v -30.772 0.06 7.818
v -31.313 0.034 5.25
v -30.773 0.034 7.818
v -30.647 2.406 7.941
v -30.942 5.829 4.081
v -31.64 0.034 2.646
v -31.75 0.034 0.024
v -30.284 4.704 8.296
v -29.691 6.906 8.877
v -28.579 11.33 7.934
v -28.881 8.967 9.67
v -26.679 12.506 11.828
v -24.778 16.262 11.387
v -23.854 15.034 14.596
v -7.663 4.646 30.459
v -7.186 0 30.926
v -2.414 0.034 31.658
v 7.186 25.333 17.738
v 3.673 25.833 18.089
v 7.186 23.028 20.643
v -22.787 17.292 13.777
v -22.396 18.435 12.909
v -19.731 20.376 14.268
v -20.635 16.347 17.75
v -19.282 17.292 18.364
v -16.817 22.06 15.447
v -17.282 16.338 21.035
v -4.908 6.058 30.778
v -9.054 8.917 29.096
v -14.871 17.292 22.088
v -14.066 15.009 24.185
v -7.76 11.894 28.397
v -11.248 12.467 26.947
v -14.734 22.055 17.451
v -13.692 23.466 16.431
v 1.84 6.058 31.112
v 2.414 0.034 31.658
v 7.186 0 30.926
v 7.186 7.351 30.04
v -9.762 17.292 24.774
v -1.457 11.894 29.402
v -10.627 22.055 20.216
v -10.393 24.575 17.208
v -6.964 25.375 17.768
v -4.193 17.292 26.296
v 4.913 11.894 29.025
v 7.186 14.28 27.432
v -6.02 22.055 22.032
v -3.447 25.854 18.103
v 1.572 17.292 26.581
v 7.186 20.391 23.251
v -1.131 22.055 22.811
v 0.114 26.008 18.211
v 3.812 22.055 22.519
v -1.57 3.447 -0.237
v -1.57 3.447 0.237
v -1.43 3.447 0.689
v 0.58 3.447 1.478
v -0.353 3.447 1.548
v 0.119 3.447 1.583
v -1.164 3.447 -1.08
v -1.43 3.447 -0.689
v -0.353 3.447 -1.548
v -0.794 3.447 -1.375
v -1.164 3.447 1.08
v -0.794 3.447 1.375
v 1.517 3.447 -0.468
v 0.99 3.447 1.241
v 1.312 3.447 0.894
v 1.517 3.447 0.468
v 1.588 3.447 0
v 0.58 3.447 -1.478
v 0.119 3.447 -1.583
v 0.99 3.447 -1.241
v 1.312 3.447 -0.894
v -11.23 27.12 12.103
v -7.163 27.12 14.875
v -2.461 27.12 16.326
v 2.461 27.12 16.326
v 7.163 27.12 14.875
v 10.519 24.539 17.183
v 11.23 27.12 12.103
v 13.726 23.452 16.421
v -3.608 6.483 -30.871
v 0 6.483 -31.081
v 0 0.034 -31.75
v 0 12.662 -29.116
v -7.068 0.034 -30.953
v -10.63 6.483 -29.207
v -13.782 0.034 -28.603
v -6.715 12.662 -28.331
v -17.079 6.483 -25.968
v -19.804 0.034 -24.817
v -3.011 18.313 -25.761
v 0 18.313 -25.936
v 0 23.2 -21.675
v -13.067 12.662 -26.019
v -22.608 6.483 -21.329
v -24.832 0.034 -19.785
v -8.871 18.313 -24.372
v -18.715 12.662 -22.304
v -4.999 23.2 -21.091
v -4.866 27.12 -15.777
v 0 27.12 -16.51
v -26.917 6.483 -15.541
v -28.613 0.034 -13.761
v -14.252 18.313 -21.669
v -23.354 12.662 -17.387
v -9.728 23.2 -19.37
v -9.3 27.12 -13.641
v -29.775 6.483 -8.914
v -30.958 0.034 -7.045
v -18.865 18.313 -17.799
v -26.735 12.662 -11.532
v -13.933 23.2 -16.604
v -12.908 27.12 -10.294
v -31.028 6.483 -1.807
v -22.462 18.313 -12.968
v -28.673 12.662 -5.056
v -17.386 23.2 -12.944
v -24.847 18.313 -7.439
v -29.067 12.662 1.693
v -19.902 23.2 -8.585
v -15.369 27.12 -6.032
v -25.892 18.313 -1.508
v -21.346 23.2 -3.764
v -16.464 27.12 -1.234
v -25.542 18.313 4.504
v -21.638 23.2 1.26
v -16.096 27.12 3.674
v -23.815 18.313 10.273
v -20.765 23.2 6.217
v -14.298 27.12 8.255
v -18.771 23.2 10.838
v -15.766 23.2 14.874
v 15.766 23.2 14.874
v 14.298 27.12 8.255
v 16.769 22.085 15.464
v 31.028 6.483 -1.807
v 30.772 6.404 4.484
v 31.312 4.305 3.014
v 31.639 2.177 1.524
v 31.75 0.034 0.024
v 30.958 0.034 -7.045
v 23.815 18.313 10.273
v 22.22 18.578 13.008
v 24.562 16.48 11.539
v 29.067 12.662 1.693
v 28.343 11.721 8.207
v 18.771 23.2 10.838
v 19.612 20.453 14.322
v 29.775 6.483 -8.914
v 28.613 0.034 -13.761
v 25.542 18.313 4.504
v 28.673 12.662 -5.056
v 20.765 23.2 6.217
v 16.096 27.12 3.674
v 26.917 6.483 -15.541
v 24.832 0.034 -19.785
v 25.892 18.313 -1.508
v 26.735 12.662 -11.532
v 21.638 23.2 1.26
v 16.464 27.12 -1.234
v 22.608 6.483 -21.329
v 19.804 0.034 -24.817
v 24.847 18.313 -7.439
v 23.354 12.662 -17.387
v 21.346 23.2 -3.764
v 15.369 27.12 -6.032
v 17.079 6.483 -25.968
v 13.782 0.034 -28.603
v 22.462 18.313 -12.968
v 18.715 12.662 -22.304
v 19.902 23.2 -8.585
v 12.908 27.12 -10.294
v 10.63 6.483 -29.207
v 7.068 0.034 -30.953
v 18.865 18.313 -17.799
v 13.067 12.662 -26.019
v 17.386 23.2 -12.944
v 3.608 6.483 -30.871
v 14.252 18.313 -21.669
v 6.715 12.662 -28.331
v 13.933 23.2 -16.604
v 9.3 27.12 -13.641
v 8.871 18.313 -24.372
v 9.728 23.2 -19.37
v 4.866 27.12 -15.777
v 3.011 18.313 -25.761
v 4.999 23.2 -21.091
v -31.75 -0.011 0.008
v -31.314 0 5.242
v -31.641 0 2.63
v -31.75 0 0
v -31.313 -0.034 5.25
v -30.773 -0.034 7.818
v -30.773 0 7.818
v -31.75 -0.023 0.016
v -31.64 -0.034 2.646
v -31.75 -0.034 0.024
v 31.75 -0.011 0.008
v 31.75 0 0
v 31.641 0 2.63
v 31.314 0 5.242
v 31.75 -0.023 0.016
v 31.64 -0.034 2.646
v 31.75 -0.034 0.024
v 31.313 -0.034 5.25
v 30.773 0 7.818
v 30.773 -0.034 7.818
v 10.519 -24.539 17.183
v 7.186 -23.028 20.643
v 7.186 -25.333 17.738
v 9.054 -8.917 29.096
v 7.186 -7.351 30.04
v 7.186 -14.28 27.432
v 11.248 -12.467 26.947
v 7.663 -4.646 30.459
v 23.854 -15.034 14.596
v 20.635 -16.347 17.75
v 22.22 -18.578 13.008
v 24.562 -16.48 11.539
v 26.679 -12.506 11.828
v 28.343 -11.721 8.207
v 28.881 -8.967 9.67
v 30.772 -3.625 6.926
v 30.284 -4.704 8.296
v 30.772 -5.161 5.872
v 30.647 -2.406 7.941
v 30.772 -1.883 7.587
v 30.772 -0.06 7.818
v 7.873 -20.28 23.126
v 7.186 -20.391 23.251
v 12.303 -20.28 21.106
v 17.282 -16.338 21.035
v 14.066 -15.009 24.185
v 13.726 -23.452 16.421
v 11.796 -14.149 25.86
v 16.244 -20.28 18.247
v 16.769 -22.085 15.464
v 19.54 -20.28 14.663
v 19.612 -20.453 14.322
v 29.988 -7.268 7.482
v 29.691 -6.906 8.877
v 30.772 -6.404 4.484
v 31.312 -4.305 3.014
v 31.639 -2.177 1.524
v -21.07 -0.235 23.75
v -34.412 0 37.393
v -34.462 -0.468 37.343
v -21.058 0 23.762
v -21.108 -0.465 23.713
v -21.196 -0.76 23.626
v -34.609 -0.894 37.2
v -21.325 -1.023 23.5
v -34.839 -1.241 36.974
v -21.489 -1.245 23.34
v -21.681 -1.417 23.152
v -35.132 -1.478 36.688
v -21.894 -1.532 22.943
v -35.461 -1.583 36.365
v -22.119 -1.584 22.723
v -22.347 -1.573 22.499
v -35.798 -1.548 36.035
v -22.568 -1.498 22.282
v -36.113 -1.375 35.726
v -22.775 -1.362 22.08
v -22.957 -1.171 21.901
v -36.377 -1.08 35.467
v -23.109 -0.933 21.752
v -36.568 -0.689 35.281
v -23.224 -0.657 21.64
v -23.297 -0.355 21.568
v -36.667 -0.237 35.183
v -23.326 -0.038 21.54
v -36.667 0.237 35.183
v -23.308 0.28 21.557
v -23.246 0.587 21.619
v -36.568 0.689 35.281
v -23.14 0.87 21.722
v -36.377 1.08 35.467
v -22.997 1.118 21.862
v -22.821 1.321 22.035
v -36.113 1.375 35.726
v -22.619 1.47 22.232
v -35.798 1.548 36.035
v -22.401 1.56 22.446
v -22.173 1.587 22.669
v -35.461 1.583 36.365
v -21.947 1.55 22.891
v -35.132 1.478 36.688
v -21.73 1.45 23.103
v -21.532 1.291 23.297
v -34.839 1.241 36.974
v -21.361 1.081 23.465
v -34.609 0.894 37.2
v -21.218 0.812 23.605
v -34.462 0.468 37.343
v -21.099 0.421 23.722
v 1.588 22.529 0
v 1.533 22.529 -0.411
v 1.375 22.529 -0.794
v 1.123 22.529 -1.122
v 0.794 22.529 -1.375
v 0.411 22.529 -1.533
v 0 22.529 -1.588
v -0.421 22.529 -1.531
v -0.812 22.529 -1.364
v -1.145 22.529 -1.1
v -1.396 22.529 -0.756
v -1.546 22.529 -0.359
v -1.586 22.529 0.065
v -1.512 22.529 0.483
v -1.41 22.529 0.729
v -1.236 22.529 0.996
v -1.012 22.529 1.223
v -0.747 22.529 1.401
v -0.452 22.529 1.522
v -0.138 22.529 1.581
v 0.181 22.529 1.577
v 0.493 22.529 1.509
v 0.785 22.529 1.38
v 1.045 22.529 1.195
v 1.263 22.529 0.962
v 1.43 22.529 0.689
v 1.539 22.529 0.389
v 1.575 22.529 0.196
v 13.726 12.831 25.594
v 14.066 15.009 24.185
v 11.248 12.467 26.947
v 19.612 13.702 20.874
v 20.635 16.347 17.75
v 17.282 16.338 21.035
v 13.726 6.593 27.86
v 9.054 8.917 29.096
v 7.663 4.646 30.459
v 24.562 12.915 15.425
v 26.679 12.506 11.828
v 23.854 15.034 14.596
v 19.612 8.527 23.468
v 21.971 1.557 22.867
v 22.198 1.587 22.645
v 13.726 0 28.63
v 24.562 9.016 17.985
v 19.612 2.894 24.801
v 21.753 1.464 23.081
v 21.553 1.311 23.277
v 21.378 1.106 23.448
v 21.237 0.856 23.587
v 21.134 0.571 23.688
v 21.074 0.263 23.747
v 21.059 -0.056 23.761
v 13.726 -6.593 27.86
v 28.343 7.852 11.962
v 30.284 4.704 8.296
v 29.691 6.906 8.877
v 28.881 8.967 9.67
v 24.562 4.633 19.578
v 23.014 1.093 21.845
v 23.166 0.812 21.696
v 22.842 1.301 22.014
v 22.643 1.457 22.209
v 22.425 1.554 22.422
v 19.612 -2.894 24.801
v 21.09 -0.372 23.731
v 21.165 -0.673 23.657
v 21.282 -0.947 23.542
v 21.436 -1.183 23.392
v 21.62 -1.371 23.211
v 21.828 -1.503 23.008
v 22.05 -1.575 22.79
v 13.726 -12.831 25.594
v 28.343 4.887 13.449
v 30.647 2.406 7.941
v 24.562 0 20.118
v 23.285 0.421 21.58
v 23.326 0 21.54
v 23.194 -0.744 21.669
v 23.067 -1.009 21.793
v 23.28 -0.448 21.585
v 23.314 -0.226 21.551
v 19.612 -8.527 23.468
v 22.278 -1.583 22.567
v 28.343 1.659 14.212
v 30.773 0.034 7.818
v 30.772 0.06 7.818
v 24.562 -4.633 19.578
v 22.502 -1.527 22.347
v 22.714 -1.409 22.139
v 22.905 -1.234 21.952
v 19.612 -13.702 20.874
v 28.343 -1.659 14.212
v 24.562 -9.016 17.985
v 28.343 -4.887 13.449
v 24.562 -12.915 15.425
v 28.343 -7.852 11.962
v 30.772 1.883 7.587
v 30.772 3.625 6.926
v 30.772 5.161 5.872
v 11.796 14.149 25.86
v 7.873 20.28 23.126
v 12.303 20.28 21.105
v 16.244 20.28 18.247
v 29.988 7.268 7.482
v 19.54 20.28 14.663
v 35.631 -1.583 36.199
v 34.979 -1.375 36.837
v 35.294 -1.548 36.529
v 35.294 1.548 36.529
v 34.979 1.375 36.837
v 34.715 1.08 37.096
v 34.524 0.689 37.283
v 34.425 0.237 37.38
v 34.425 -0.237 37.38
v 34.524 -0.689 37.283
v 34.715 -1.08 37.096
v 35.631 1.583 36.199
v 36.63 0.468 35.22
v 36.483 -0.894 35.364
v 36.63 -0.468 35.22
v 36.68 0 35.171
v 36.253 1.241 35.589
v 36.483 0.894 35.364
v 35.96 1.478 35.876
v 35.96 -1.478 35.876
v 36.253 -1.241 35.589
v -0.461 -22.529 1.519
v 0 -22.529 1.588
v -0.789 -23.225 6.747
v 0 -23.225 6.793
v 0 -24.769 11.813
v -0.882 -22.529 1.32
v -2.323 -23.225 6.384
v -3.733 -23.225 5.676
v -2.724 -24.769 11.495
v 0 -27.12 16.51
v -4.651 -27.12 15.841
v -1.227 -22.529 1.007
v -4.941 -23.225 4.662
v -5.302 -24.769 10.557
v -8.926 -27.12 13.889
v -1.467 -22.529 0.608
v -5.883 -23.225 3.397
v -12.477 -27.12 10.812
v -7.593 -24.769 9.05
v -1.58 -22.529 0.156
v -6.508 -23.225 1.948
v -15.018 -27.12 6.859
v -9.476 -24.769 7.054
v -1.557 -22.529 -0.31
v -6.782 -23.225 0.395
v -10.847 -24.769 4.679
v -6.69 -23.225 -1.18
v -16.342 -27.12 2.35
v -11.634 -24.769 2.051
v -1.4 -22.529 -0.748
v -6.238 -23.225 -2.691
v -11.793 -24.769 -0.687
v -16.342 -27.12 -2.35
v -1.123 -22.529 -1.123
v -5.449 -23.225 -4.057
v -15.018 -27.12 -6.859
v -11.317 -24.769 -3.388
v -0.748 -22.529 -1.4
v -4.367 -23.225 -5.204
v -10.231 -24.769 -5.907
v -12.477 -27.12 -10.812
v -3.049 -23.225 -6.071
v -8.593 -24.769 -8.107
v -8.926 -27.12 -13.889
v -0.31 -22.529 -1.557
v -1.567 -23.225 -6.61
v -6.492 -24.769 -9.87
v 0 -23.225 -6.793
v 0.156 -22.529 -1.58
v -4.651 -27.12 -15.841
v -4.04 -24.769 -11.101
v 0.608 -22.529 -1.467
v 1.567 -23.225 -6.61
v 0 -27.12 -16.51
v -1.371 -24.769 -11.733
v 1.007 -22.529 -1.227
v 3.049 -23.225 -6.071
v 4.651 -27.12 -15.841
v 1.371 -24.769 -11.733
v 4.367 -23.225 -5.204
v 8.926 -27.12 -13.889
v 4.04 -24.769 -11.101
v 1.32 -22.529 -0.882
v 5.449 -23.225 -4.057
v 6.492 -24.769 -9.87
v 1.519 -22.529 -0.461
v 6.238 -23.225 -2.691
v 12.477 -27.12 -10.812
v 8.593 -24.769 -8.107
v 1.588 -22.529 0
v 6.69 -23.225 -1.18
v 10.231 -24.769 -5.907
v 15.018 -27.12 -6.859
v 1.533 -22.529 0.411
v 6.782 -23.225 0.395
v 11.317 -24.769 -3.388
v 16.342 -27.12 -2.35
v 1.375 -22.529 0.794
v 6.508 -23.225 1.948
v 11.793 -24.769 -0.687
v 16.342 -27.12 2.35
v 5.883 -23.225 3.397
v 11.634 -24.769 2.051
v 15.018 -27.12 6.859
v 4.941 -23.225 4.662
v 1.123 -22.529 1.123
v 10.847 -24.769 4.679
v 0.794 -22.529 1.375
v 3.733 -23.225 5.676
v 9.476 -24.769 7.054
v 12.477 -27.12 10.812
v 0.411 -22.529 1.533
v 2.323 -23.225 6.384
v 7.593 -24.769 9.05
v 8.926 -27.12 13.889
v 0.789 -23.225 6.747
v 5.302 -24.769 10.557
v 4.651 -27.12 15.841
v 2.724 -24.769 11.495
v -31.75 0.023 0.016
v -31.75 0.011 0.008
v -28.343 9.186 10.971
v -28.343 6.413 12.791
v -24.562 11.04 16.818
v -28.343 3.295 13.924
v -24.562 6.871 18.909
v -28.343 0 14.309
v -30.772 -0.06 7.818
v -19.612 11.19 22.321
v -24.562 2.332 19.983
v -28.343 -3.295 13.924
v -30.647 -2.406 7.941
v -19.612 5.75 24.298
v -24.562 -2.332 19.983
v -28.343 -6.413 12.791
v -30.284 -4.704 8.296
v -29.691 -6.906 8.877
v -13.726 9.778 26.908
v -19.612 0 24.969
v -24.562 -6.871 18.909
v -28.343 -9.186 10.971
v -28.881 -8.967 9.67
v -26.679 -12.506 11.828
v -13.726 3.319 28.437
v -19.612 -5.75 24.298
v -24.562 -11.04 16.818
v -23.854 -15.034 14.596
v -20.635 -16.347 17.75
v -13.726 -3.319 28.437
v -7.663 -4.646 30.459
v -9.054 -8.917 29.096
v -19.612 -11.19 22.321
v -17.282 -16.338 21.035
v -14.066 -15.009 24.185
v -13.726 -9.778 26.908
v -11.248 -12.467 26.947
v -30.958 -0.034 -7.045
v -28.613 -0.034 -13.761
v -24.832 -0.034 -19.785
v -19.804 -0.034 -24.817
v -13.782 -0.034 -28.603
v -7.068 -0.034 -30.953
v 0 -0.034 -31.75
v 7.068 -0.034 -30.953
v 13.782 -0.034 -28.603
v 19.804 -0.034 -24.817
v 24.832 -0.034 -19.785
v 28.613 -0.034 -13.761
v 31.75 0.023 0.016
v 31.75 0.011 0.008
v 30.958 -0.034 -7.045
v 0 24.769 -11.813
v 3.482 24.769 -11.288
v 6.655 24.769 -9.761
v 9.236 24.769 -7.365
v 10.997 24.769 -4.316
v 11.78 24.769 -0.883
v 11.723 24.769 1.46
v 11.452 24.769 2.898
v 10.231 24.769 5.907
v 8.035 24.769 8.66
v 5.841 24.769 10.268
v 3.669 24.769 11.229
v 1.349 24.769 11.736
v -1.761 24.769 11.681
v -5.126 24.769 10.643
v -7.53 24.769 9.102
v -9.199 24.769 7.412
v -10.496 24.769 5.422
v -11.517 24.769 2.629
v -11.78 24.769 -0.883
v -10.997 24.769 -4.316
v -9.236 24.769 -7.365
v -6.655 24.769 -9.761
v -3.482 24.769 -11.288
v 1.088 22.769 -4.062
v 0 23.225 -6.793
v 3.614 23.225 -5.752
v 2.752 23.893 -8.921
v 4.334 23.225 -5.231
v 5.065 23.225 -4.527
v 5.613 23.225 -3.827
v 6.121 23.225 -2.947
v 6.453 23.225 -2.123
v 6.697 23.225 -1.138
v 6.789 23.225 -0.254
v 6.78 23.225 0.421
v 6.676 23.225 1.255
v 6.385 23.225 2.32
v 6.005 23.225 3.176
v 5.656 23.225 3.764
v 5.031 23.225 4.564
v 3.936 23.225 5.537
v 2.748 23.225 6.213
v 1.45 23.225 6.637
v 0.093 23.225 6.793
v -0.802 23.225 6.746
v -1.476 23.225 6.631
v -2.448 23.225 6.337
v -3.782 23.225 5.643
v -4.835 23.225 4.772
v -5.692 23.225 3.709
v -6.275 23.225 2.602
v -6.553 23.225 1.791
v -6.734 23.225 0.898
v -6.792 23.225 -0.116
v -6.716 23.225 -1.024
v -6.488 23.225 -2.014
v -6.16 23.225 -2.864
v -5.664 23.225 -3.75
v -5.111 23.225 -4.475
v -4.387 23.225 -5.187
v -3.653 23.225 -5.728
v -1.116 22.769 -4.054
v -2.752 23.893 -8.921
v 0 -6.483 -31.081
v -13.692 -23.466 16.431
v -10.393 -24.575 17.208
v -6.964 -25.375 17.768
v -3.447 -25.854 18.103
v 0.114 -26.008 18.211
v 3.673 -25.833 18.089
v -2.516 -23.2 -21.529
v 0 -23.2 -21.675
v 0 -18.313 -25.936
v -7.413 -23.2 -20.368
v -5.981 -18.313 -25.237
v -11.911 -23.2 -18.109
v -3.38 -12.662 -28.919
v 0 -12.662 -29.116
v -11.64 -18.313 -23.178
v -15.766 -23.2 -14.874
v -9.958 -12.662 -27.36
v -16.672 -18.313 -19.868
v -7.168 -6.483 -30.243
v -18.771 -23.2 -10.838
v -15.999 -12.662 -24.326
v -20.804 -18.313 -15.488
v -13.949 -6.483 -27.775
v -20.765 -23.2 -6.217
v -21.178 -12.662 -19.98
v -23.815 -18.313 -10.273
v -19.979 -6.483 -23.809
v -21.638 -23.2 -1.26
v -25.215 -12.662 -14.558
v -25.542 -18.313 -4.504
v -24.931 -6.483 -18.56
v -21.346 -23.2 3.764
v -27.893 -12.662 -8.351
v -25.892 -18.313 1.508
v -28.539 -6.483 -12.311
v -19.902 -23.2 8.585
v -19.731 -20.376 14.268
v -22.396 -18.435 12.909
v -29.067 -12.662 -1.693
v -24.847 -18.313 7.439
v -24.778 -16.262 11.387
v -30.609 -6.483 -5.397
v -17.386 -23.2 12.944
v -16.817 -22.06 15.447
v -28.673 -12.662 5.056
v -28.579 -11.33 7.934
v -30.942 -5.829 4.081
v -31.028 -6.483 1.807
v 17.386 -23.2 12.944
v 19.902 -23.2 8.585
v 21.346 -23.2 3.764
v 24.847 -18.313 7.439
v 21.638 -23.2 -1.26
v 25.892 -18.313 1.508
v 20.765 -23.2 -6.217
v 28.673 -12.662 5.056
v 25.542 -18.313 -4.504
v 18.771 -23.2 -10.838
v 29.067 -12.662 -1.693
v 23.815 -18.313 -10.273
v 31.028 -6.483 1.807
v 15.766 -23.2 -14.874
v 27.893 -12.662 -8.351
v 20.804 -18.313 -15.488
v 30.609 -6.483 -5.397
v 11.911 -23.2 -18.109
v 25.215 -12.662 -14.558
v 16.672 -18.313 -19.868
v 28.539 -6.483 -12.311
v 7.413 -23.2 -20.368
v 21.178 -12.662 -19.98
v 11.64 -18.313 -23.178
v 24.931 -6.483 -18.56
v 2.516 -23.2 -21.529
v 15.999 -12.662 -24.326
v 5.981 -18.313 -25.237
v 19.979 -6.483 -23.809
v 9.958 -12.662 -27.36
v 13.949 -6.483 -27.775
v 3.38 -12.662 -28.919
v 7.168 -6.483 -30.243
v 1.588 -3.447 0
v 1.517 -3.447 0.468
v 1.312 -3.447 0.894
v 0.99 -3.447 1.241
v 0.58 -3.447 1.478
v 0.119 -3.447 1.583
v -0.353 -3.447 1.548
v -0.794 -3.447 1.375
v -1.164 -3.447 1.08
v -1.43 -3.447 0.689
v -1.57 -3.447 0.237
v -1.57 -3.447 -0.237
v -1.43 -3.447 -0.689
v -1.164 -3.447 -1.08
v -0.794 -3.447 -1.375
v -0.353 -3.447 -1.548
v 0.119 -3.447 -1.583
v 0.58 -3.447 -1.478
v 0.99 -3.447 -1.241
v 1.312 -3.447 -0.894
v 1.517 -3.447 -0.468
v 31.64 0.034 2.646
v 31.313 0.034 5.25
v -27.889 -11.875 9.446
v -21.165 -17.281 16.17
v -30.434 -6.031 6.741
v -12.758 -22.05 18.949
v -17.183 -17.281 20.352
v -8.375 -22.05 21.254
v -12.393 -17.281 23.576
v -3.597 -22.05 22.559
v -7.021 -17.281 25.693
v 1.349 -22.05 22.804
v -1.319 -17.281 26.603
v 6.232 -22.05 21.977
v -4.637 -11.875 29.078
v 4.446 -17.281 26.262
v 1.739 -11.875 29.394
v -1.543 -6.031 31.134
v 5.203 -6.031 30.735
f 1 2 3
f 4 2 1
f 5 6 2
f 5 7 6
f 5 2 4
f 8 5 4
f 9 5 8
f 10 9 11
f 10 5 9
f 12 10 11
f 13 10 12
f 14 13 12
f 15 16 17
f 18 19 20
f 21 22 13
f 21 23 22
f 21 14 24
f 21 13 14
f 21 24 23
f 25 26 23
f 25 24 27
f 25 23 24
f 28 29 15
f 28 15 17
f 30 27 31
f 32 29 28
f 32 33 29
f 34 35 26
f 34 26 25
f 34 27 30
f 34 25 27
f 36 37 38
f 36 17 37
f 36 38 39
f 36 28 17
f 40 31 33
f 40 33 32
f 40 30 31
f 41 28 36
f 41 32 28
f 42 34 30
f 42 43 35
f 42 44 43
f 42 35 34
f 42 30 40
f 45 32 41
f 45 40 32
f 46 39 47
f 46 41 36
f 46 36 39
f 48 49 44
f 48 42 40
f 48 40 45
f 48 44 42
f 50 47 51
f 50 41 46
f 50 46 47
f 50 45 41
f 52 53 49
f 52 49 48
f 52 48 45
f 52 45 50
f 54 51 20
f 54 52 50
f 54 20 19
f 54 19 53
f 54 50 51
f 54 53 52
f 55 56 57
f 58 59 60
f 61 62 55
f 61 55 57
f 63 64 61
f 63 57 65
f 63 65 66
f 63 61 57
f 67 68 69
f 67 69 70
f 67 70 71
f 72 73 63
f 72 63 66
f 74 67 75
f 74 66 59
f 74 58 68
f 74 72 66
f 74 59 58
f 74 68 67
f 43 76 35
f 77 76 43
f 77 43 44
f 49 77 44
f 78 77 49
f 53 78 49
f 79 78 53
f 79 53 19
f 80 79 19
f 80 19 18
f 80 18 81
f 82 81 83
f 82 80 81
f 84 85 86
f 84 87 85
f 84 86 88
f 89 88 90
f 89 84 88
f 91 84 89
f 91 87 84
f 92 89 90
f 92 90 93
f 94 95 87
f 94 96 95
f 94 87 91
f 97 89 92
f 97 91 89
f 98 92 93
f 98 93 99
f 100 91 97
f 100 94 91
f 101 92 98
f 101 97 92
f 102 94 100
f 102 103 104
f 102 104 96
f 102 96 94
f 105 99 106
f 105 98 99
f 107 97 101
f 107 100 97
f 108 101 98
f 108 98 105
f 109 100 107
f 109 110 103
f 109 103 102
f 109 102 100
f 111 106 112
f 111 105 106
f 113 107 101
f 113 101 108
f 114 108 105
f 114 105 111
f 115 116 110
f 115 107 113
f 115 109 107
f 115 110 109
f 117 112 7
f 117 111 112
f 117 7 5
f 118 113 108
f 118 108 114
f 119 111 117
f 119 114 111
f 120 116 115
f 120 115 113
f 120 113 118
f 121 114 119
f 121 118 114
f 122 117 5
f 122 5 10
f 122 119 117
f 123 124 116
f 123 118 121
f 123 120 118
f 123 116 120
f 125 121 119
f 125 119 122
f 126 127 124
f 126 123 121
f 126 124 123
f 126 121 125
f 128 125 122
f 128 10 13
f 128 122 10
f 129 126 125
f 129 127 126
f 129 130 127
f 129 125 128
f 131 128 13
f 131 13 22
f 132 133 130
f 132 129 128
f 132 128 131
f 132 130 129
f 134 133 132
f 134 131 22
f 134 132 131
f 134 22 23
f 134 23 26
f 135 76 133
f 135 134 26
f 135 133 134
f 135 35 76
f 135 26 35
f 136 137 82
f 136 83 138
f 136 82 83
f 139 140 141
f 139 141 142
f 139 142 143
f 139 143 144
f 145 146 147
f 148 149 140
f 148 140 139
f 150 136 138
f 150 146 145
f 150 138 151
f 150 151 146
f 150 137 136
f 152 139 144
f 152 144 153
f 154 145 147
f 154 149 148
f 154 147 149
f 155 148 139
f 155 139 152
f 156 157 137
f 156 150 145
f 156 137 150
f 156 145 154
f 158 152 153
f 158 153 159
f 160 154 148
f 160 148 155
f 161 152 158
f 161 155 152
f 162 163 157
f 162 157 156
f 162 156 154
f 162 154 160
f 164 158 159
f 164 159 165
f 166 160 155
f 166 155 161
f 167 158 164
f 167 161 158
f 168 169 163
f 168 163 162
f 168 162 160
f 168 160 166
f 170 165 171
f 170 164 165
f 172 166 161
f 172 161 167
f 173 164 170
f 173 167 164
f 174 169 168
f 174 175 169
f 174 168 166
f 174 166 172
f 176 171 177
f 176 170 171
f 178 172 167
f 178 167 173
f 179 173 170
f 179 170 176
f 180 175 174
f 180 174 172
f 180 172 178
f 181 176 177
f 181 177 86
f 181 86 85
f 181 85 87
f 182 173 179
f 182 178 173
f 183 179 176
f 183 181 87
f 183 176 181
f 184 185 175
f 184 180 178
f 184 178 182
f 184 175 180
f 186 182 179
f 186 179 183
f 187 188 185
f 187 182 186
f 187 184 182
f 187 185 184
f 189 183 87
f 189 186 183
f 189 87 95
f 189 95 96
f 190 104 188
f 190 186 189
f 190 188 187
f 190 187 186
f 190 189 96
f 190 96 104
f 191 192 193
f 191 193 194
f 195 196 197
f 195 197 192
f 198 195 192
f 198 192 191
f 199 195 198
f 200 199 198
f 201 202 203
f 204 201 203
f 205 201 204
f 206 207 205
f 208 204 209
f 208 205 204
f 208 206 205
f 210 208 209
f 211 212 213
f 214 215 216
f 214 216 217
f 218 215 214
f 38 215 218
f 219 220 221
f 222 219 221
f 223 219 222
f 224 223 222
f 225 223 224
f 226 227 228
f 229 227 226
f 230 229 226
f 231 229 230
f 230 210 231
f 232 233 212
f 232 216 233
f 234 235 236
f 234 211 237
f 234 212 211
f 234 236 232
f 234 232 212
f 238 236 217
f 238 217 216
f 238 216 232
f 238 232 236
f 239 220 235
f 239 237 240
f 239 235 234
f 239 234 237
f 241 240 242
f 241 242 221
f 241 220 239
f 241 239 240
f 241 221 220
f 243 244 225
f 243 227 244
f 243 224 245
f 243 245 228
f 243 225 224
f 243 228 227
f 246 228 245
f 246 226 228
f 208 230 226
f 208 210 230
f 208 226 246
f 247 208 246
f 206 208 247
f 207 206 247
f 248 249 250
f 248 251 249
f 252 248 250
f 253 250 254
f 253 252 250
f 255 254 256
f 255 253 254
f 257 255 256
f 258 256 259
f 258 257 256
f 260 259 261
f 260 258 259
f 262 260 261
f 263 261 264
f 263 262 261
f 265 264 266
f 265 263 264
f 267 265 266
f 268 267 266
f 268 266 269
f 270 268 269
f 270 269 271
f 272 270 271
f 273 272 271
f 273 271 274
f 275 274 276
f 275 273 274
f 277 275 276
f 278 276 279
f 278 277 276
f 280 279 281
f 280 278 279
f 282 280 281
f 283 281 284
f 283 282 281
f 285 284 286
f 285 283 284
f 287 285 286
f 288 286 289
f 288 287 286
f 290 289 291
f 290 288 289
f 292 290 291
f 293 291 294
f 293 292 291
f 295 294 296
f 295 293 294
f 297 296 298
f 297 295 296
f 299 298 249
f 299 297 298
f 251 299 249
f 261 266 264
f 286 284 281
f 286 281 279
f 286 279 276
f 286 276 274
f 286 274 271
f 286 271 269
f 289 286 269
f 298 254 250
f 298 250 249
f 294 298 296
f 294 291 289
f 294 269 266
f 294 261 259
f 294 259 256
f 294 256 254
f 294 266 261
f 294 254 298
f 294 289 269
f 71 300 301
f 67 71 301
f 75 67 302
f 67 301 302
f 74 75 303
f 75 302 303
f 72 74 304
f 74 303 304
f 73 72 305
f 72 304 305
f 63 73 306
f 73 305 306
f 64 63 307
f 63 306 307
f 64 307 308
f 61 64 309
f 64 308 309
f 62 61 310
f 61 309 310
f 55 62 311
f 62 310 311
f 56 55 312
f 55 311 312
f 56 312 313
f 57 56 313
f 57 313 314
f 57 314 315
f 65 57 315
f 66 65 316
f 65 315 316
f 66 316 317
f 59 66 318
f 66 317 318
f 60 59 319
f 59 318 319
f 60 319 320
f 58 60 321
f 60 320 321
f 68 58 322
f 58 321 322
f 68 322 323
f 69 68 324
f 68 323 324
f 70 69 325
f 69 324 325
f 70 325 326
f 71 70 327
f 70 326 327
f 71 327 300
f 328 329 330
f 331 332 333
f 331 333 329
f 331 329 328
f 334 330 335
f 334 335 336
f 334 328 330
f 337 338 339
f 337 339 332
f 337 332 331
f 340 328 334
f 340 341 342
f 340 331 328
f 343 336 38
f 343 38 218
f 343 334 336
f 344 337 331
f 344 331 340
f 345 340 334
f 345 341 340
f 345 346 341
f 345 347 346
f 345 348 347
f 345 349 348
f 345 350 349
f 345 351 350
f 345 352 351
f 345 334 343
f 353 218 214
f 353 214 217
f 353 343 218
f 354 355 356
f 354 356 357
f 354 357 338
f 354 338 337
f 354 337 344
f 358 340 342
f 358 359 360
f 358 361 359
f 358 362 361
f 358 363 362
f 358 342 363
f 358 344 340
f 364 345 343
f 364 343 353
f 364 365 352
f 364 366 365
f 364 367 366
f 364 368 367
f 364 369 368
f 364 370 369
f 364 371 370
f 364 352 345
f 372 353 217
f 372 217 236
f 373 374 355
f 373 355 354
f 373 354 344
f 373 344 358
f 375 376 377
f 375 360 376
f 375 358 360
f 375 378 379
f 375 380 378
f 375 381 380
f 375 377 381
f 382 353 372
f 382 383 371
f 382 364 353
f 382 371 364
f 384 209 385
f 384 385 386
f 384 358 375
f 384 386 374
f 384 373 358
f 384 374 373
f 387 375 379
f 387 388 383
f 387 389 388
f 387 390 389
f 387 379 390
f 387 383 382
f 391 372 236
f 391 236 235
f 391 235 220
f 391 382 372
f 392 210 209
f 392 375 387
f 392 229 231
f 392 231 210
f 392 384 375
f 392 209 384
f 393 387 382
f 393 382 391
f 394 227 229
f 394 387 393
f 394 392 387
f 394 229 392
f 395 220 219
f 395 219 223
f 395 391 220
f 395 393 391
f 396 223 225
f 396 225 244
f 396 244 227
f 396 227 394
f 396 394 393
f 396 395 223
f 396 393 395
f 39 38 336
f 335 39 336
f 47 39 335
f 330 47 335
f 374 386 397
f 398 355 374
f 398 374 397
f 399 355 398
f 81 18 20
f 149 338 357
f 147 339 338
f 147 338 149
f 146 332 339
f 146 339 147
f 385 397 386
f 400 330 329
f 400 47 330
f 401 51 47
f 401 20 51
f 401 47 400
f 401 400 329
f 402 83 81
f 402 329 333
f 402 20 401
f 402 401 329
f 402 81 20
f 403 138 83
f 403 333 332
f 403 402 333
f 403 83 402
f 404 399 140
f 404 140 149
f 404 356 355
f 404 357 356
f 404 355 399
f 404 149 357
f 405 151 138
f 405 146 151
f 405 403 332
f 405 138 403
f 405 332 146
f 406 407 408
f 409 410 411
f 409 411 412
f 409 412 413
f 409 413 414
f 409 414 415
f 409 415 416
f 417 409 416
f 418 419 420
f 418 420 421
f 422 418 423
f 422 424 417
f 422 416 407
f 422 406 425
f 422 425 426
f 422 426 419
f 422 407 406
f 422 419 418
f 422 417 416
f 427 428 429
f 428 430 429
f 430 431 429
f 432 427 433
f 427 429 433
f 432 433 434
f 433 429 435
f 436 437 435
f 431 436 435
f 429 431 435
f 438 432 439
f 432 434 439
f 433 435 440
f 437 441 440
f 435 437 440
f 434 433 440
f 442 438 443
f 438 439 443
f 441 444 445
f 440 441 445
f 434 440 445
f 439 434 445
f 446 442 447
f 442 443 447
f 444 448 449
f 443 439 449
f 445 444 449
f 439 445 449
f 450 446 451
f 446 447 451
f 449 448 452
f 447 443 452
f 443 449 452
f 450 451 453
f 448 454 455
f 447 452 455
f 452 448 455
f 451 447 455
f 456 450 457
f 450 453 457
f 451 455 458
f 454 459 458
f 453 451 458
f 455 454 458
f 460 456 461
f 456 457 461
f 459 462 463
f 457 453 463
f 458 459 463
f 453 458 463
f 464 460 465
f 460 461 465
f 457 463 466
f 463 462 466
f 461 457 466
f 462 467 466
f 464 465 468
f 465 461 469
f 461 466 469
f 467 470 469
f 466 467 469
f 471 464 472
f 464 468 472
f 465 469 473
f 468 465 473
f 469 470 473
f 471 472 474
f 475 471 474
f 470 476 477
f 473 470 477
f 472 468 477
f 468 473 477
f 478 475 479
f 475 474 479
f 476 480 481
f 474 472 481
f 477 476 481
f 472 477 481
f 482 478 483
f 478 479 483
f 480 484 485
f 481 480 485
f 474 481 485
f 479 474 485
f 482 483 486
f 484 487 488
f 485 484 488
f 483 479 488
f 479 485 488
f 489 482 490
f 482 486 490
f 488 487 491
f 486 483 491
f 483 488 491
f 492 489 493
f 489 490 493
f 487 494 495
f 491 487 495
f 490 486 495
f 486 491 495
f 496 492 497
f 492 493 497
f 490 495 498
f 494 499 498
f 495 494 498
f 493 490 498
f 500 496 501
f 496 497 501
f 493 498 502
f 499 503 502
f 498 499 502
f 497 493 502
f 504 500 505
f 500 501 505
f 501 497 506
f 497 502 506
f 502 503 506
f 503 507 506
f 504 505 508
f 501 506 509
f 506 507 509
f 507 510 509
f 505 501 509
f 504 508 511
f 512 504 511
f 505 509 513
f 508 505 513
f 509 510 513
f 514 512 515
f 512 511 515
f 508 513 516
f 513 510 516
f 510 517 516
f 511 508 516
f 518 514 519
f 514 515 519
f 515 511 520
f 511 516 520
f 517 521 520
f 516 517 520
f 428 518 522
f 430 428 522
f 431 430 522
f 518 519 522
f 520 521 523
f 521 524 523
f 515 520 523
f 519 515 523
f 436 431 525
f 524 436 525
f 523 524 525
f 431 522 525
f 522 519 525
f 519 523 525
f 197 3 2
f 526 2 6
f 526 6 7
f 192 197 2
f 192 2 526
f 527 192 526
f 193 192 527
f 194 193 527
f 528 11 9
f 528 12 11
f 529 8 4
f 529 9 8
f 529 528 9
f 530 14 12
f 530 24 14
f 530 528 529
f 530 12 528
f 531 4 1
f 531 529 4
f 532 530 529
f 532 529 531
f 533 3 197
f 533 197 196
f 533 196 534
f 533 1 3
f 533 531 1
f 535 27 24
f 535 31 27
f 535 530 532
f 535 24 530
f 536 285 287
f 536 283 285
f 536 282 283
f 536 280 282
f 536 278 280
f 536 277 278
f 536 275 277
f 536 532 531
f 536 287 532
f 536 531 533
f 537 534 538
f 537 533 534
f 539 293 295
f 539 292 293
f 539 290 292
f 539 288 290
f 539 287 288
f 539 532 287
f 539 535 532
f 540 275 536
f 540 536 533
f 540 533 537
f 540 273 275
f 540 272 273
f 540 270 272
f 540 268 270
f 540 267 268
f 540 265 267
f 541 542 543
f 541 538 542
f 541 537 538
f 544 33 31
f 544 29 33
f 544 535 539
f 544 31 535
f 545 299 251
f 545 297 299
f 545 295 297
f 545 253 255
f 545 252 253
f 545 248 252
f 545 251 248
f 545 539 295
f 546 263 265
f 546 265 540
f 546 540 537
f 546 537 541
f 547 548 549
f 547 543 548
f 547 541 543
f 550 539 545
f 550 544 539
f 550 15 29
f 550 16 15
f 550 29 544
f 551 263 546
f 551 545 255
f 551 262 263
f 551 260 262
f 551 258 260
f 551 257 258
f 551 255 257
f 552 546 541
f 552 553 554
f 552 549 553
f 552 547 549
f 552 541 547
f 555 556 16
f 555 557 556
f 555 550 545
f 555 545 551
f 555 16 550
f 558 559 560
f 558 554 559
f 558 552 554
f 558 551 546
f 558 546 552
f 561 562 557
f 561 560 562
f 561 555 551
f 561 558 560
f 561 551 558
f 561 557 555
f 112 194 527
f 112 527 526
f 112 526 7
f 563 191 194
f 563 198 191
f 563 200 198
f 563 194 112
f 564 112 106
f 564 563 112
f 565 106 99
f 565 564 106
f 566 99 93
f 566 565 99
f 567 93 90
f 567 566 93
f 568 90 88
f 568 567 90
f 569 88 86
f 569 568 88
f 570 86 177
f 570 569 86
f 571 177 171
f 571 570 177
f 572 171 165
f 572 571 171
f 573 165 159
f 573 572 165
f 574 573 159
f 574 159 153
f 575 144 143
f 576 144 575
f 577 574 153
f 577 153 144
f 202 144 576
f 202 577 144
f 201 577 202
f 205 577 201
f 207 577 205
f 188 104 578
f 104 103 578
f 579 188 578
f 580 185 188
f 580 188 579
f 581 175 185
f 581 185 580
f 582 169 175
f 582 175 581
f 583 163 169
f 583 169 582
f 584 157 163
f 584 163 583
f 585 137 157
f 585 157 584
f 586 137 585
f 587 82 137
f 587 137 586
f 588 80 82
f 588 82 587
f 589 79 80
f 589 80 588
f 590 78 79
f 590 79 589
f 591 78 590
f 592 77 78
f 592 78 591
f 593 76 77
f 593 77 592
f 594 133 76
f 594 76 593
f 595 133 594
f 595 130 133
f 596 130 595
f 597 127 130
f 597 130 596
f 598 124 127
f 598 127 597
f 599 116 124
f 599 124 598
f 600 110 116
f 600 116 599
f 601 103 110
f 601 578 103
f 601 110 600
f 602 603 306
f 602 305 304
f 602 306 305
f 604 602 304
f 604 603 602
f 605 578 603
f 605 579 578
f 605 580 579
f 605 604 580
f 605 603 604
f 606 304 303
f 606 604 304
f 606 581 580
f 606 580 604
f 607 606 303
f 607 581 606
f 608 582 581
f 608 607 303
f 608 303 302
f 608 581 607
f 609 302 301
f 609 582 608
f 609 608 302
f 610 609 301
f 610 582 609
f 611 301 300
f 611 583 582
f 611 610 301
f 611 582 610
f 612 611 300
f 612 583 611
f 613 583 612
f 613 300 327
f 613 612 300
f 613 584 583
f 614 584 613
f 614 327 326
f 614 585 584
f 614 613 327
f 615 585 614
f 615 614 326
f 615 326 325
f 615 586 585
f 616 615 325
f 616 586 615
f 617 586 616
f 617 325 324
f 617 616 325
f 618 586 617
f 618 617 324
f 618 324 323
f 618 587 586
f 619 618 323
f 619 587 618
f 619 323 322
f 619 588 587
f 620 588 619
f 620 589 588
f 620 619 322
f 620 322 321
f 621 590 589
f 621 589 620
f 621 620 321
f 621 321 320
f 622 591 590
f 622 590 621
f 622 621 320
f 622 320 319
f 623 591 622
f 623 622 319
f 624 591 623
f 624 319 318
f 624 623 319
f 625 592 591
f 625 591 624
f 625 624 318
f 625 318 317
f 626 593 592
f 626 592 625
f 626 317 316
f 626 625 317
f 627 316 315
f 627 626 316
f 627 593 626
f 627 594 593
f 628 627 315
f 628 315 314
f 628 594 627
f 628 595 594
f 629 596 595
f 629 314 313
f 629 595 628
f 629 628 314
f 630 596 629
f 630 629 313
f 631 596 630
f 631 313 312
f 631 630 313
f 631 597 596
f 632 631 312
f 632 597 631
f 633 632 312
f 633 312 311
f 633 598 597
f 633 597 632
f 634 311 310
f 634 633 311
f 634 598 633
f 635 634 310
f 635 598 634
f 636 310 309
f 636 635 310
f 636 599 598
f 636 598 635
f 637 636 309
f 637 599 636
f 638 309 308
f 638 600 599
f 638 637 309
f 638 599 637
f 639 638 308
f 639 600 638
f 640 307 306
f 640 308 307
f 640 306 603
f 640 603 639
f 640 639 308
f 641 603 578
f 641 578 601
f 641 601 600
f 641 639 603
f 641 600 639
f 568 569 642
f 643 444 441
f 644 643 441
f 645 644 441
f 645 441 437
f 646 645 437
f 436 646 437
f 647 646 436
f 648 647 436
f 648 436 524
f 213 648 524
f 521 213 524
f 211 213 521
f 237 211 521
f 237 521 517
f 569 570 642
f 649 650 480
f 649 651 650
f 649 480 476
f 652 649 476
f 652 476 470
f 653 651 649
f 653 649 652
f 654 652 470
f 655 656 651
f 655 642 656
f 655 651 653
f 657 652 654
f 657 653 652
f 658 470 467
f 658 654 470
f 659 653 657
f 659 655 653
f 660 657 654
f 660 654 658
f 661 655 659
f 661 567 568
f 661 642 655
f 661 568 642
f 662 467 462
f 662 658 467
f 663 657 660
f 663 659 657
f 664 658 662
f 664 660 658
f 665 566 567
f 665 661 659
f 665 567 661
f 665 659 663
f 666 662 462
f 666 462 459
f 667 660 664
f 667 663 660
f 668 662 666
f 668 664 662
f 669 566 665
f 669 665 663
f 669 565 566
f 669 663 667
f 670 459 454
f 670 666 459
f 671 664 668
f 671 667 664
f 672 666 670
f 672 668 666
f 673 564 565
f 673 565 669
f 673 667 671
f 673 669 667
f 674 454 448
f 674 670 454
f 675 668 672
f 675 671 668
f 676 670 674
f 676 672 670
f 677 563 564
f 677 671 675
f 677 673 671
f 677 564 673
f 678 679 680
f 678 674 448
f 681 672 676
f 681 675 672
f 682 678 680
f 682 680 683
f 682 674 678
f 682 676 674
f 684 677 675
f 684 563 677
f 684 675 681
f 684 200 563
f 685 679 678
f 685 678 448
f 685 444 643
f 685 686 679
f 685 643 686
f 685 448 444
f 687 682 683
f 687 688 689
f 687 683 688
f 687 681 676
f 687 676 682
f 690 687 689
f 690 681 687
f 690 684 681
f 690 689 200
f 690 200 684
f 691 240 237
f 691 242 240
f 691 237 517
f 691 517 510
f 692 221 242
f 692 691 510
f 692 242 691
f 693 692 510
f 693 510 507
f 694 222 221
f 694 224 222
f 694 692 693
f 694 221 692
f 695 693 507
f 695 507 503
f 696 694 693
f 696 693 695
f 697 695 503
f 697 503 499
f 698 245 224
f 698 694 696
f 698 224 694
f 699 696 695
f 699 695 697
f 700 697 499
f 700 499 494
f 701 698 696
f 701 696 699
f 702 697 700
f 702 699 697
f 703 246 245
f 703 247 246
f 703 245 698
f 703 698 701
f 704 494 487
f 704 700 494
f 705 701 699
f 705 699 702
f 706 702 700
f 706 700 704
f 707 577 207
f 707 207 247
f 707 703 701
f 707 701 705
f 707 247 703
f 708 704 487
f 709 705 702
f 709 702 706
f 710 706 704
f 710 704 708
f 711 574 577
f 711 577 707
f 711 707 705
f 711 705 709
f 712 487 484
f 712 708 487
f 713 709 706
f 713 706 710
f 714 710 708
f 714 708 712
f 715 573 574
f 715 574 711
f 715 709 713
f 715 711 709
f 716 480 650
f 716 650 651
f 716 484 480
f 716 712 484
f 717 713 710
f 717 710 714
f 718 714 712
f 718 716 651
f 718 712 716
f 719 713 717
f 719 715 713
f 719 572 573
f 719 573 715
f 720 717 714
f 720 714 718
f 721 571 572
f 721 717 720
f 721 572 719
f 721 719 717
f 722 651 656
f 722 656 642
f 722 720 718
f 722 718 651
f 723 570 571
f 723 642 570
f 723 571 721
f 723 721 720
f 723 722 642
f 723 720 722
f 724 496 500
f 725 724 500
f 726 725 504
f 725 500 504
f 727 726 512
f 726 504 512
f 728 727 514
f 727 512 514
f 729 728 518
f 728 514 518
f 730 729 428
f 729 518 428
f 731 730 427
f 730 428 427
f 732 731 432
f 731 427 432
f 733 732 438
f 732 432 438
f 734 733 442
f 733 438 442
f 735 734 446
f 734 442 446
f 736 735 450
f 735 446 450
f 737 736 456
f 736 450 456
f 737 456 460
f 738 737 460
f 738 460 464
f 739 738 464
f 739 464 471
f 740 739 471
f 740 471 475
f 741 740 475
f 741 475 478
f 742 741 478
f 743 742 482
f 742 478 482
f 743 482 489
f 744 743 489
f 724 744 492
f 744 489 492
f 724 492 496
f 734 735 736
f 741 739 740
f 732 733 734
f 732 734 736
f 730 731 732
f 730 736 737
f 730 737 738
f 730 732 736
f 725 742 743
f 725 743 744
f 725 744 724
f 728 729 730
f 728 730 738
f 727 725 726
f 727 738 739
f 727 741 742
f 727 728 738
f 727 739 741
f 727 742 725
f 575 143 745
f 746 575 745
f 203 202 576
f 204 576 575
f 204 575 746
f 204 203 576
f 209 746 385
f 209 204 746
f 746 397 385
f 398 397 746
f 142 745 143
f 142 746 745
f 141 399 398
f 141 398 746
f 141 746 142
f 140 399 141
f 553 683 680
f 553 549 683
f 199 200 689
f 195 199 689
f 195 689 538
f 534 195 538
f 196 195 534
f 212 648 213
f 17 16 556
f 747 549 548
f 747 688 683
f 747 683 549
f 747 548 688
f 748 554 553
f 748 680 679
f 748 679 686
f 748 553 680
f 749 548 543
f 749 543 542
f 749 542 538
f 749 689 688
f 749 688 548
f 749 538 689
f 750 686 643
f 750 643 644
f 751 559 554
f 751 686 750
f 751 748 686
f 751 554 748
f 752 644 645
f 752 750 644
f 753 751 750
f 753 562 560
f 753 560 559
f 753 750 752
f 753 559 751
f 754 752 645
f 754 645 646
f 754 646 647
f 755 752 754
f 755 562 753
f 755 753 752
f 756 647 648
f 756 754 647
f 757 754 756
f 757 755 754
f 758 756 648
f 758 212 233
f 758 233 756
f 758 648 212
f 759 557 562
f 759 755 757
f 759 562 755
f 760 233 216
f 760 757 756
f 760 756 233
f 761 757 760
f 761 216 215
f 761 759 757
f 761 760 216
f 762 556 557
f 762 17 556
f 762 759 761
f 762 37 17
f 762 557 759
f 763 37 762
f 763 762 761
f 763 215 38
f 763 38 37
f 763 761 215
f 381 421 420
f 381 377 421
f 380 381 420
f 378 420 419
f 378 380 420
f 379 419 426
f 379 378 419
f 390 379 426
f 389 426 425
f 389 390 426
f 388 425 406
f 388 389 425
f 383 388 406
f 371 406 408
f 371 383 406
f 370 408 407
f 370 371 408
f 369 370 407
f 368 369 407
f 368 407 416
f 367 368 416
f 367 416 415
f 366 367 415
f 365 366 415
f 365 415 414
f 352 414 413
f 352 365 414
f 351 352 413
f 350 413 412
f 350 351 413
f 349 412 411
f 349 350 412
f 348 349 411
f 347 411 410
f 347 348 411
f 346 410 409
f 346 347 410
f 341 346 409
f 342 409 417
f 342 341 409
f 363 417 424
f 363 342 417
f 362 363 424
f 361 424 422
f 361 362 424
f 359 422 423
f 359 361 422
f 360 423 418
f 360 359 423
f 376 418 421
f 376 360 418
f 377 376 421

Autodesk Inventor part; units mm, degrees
ref_plane "YZ Plane" through (0, 0, 0) normal (1, 0, 0) x (0, 1, 0)
ref_plane "XZ Plane" through (0, 0, 0) normal (0, 1, 0) x (-1, 0, 0)
ref_plane "XY Plane" through (0, 0, 0) normal (0, 0, 1) x (1, 0, 0)
sketch "Sketch3" plane through (0, 0, 0) normal (1, 0, 0) x (0, 1, 0)
  line L0 (-27.1198, 0) -> (-27.1198, -16.51)
  line L1 (27.1198, 0) -> (27.1198, -16.51)
  arc A0 (-27.1198, -16.51) -> (27.1198, -16.51) centre (0, 0) ccw
  line L2 (27.1198, 0) -> (-27.1198, 0)
revolve "Revolution2" add sketch "Sketch3" angle 360 about axis through (0, 27.1198, 0) along (0, -1, 0)
sketch "Sketch5" plane through (0, 27.1198, 0) normal (0, 1, 0) x (1, 0, 0)
  circle A0 centre (0, 0) radius 1.5875
  dimension "d7" = 3.175
extrude "Extrusion1" cut sketch "Sketch5" against normal blind 23.6728
sketch "Sketch6" plane through (0, 0, 0) normal (1, 0, 0) x (0, 1, 0)
  line L0 (27.1198, 16.51) -> (27.1198, -16.51) projected
  line L1 (27.1198, 16.51) -> (54.2396, 0)
  line L2 (54.2396, 0) -> (27.1198, -16.51)
  line L3 (27.1198, 16.51) -> (27.1198, -16.51)
  arc A0 (22.4896, 0) -> (27.1198, -16.51) centre (54.2396, 0) ccw
  line L4 (85.9896, 0) -> (22.4896, 0)
  point P0 (0, 0)
  point P1 (27.1198, 0)
  dimension "d10" = 31.75
  dimension "d11" = 31.75
  dimension "d12" = 33.02
  dimension "d13" = 63.5
revolve "Revolution3" cut sketch "Sketch6" angle 360 about axis through (0, 85.9896, 0) along (0, -1, 0) contours L0 A0 L4
sketch "Sketch7" plane through (0, -27.1198, 0) normal (0, -1, 0) x (1, 0, 0)
  circle A0 centre (0, 0) radius 1.5875 projected
  circle A1 centre (0, 0) radius 1.5875
  point P0 (0, 0)
extrude "Extrusion2" cut sketch "Sketch7" against normal blind 23.6728
sketch "Sketch8" plane through (0, 0, 0) normal (1, 0, 0) x (0, 1, 0)
  line L0 (-27.1198, 16.51) -> (-27.1198, -16.51) projected
  line L1 (-27.1198, 16.51) -> (-27.1198, -16.51)
  line L2 (-27.1198, -16.51) -> (-54.2396, 0)
  line L3 (-54.2396, 0) -> (-27.1198, 16.51)
  circle A0 centre (-54.2396, 0) radius 31.75
  line L4 (-54.2396, 0) -> (-22.4896, 0)
  point P0 (0, 0)
  point P1 (-27.1198, 0)
  point P2 (-22.4896, 0)
  dimension "d17" = 33.02
  dimension "d18" = 31.75
  dimension "d19" = 31.75
  dimension "d20" = 31.75
revolve "Revolution4" cut sketch "Sketch8" angle 360 about axis through (0, -54.2396, 0) along (0, 1, 0) picked at (-26.272, 9.2768) contours A0 L4 L0
sketch "Sketch9" plane through (0, 0, 0) normal (0, 1, 0) x (-1, 0, 0)
  circle A0 centre (0, 0) radius 31.75
  line L0 (30.7725, 7.8175) -> (7.1862, 30.9261)
  line L1 (-30.7725, 7.8175) -> (-7.1862, 30.9261)
extrude "Extrusion3" cut sketch "Sketch9" along normal mid plane 101.6 contours A0 L1 L0 keep common part
sketch "Sketch10" plane through (18.9794, 0, 19.3718) normal (0.6998, 0, 0.7143) x (0.7143, 0, -0.6998)
  circle A0 centre (0, 0) radius 1.5875
  dimension "d24" = 3.175
extrude "Extrusion4" add sketch "Sketch10" along normal blind 23.6728
sketch "Sketch11" plane through (-18.9794, 0, 19.3718) normal (-0.6998, 0, 0.7143) x (0.7143, 0, 0.6998)
  circle A0 centre (0, 0) radius 1.5875
  dimension "d27" = 3.175
extrude "Extrusion5" add sketch "Sketch11" along normal blind 23.6728
sketch "Sketch12" plane through (0, 0, 0) normal (0, 1, 0) x (-1, 0, 0)
  circle A0 centre (0, 0) radius 1.5875 projected
  circle A1 centre (0, 0) radius 31.75
  arc A2 (-30.7725, 7.8175) -> (-7.1862, 30.9261) centre (0, 0) ccw projected
  line L0 (-31.75, 0) -> (31.75, 0)
  point P0 (-1.5875, 0)
  point P1 (1.5875, 0)
  point P2 (31.75, 0)
revolve "Revolution5" add sketch "Sketch12" angle 110 mid plane about axis through (31.75, 0, 0) along (-1, 0, 0) picked at (21.4293, 2.3601) contours A0 L0 A1
properties part number "solid mid ball"
